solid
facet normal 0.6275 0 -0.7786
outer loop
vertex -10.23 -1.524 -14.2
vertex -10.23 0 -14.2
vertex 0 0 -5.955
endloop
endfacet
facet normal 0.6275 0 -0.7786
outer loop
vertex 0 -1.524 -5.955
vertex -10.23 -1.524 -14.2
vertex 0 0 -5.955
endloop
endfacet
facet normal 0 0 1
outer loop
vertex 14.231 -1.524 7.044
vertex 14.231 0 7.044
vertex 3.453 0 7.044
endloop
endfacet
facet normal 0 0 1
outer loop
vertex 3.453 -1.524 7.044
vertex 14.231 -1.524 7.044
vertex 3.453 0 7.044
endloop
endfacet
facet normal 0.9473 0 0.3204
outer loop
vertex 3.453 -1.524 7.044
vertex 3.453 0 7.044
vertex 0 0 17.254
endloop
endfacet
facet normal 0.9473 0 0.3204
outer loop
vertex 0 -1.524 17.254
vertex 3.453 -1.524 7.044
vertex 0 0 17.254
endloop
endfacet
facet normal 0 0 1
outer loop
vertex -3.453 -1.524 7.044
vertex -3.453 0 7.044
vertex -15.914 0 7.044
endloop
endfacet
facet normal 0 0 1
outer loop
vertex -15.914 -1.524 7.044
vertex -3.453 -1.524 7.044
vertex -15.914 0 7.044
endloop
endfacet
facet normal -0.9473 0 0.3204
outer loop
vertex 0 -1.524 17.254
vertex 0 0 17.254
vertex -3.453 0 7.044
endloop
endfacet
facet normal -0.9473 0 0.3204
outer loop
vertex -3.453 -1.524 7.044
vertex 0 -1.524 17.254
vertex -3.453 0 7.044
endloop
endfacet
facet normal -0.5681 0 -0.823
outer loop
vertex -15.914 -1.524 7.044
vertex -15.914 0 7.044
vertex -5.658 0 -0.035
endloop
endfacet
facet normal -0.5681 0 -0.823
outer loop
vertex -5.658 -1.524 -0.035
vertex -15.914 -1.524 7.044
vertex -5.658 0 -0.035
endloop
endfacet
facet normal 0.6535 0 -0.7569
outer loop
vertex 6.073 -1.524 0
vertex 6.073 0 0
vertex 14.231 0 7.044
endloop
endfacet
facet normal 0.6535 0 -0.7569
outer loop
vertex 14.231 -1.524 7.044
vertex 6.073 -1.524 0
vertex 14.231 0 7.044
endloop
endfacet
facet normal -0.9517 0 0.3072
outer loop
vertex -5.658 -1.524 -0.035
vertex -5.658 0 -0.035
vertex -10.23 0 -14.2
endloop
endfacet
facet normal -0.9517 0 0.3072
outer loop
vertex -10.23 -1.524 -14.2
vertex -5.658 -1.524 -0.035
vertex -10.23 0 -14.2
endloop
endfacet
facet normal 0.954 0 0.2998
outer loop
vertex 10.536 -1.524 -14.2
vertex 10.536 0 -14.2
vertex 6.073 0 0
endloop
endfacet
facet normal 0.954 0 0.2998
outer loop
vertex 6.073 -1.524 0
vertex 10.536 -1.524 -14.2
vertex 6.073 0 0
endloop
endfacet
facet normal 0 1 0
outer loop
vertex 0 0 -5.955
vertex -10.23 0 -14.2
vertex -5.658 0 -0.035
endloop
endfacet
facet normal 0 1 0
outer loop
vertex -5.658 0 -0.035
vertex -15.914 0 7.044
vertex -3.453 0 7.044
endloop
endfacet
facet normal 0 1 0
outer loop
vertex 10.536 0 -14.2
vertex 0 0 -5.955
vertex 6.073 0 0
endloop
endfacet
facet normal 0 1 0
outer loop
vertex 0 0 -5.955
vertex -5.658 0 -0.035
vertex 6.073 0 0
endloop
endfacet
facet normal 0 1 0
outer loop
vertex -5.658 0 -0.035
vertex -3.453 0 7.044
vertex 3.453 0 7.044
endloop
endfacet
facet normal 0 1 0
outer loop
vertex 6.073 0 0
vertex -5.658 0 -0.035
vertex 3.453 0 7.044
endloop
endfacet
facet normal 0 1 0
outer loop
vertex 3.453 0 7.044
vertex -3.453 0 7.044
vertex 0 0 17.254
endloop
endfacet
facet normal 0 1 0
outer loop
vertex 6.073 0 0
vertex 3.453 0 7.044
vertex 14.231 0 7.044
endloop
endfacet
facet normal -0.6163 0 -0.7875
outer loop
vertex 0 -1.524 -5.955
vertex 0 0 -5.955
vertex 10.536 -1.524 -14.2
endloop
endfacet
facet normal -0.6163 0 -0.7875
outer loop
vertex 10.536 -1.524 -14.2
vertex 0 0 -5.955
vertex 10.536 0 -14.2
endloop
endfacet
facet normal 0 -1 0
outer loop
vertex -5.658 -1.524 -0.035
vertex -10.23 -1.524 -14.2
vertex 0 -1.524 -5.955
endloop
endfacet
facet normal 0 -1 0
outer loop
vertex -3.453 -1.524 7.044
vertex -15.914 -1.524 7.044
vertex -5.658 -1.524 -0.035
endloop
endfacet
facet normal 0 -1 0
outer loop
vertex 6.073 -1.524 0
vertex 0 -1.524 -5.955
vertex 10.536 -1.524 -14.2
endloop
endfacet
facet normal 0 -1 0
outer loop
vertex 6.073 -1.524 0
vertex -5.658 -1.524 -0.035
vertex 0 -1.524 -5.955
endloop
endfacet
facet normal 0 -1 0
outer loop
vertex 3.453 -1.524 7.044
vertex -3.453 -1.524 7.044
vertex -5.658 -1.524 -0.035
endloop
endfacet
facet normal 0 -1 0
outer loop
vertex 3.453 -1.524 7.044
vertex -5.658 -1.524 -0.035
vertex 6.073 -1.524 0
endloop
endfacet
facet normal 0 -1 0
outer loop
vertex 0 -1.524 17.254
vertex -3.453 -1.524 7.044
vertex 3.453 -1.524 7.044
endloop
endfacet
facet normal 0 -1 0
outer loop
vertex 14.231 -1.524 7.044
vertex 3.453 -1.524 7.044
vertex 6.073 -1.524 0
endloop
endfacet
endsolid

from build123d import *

# Parameters (mm, degrees)
F2_DEPTH = 1.524


with BuildPart() as f2:
    # F1 (on face) → F2 (new body)
    with BuildSketch(Plane.XZ):
        Polygon((3.452803, 7.043747), (0, 17.254066), (-3.452803, 7.043747), (-15.913724, 7.043747), (-5.658479, -0.034705), (-10.230287, -14.200249), (0, -5.954943), (10.535668, -14.200249), (6.072822, 0), (14.231136, 7.043747), align=None)
    extrude(amount=F2_DEPTH)


solid = f2.part
